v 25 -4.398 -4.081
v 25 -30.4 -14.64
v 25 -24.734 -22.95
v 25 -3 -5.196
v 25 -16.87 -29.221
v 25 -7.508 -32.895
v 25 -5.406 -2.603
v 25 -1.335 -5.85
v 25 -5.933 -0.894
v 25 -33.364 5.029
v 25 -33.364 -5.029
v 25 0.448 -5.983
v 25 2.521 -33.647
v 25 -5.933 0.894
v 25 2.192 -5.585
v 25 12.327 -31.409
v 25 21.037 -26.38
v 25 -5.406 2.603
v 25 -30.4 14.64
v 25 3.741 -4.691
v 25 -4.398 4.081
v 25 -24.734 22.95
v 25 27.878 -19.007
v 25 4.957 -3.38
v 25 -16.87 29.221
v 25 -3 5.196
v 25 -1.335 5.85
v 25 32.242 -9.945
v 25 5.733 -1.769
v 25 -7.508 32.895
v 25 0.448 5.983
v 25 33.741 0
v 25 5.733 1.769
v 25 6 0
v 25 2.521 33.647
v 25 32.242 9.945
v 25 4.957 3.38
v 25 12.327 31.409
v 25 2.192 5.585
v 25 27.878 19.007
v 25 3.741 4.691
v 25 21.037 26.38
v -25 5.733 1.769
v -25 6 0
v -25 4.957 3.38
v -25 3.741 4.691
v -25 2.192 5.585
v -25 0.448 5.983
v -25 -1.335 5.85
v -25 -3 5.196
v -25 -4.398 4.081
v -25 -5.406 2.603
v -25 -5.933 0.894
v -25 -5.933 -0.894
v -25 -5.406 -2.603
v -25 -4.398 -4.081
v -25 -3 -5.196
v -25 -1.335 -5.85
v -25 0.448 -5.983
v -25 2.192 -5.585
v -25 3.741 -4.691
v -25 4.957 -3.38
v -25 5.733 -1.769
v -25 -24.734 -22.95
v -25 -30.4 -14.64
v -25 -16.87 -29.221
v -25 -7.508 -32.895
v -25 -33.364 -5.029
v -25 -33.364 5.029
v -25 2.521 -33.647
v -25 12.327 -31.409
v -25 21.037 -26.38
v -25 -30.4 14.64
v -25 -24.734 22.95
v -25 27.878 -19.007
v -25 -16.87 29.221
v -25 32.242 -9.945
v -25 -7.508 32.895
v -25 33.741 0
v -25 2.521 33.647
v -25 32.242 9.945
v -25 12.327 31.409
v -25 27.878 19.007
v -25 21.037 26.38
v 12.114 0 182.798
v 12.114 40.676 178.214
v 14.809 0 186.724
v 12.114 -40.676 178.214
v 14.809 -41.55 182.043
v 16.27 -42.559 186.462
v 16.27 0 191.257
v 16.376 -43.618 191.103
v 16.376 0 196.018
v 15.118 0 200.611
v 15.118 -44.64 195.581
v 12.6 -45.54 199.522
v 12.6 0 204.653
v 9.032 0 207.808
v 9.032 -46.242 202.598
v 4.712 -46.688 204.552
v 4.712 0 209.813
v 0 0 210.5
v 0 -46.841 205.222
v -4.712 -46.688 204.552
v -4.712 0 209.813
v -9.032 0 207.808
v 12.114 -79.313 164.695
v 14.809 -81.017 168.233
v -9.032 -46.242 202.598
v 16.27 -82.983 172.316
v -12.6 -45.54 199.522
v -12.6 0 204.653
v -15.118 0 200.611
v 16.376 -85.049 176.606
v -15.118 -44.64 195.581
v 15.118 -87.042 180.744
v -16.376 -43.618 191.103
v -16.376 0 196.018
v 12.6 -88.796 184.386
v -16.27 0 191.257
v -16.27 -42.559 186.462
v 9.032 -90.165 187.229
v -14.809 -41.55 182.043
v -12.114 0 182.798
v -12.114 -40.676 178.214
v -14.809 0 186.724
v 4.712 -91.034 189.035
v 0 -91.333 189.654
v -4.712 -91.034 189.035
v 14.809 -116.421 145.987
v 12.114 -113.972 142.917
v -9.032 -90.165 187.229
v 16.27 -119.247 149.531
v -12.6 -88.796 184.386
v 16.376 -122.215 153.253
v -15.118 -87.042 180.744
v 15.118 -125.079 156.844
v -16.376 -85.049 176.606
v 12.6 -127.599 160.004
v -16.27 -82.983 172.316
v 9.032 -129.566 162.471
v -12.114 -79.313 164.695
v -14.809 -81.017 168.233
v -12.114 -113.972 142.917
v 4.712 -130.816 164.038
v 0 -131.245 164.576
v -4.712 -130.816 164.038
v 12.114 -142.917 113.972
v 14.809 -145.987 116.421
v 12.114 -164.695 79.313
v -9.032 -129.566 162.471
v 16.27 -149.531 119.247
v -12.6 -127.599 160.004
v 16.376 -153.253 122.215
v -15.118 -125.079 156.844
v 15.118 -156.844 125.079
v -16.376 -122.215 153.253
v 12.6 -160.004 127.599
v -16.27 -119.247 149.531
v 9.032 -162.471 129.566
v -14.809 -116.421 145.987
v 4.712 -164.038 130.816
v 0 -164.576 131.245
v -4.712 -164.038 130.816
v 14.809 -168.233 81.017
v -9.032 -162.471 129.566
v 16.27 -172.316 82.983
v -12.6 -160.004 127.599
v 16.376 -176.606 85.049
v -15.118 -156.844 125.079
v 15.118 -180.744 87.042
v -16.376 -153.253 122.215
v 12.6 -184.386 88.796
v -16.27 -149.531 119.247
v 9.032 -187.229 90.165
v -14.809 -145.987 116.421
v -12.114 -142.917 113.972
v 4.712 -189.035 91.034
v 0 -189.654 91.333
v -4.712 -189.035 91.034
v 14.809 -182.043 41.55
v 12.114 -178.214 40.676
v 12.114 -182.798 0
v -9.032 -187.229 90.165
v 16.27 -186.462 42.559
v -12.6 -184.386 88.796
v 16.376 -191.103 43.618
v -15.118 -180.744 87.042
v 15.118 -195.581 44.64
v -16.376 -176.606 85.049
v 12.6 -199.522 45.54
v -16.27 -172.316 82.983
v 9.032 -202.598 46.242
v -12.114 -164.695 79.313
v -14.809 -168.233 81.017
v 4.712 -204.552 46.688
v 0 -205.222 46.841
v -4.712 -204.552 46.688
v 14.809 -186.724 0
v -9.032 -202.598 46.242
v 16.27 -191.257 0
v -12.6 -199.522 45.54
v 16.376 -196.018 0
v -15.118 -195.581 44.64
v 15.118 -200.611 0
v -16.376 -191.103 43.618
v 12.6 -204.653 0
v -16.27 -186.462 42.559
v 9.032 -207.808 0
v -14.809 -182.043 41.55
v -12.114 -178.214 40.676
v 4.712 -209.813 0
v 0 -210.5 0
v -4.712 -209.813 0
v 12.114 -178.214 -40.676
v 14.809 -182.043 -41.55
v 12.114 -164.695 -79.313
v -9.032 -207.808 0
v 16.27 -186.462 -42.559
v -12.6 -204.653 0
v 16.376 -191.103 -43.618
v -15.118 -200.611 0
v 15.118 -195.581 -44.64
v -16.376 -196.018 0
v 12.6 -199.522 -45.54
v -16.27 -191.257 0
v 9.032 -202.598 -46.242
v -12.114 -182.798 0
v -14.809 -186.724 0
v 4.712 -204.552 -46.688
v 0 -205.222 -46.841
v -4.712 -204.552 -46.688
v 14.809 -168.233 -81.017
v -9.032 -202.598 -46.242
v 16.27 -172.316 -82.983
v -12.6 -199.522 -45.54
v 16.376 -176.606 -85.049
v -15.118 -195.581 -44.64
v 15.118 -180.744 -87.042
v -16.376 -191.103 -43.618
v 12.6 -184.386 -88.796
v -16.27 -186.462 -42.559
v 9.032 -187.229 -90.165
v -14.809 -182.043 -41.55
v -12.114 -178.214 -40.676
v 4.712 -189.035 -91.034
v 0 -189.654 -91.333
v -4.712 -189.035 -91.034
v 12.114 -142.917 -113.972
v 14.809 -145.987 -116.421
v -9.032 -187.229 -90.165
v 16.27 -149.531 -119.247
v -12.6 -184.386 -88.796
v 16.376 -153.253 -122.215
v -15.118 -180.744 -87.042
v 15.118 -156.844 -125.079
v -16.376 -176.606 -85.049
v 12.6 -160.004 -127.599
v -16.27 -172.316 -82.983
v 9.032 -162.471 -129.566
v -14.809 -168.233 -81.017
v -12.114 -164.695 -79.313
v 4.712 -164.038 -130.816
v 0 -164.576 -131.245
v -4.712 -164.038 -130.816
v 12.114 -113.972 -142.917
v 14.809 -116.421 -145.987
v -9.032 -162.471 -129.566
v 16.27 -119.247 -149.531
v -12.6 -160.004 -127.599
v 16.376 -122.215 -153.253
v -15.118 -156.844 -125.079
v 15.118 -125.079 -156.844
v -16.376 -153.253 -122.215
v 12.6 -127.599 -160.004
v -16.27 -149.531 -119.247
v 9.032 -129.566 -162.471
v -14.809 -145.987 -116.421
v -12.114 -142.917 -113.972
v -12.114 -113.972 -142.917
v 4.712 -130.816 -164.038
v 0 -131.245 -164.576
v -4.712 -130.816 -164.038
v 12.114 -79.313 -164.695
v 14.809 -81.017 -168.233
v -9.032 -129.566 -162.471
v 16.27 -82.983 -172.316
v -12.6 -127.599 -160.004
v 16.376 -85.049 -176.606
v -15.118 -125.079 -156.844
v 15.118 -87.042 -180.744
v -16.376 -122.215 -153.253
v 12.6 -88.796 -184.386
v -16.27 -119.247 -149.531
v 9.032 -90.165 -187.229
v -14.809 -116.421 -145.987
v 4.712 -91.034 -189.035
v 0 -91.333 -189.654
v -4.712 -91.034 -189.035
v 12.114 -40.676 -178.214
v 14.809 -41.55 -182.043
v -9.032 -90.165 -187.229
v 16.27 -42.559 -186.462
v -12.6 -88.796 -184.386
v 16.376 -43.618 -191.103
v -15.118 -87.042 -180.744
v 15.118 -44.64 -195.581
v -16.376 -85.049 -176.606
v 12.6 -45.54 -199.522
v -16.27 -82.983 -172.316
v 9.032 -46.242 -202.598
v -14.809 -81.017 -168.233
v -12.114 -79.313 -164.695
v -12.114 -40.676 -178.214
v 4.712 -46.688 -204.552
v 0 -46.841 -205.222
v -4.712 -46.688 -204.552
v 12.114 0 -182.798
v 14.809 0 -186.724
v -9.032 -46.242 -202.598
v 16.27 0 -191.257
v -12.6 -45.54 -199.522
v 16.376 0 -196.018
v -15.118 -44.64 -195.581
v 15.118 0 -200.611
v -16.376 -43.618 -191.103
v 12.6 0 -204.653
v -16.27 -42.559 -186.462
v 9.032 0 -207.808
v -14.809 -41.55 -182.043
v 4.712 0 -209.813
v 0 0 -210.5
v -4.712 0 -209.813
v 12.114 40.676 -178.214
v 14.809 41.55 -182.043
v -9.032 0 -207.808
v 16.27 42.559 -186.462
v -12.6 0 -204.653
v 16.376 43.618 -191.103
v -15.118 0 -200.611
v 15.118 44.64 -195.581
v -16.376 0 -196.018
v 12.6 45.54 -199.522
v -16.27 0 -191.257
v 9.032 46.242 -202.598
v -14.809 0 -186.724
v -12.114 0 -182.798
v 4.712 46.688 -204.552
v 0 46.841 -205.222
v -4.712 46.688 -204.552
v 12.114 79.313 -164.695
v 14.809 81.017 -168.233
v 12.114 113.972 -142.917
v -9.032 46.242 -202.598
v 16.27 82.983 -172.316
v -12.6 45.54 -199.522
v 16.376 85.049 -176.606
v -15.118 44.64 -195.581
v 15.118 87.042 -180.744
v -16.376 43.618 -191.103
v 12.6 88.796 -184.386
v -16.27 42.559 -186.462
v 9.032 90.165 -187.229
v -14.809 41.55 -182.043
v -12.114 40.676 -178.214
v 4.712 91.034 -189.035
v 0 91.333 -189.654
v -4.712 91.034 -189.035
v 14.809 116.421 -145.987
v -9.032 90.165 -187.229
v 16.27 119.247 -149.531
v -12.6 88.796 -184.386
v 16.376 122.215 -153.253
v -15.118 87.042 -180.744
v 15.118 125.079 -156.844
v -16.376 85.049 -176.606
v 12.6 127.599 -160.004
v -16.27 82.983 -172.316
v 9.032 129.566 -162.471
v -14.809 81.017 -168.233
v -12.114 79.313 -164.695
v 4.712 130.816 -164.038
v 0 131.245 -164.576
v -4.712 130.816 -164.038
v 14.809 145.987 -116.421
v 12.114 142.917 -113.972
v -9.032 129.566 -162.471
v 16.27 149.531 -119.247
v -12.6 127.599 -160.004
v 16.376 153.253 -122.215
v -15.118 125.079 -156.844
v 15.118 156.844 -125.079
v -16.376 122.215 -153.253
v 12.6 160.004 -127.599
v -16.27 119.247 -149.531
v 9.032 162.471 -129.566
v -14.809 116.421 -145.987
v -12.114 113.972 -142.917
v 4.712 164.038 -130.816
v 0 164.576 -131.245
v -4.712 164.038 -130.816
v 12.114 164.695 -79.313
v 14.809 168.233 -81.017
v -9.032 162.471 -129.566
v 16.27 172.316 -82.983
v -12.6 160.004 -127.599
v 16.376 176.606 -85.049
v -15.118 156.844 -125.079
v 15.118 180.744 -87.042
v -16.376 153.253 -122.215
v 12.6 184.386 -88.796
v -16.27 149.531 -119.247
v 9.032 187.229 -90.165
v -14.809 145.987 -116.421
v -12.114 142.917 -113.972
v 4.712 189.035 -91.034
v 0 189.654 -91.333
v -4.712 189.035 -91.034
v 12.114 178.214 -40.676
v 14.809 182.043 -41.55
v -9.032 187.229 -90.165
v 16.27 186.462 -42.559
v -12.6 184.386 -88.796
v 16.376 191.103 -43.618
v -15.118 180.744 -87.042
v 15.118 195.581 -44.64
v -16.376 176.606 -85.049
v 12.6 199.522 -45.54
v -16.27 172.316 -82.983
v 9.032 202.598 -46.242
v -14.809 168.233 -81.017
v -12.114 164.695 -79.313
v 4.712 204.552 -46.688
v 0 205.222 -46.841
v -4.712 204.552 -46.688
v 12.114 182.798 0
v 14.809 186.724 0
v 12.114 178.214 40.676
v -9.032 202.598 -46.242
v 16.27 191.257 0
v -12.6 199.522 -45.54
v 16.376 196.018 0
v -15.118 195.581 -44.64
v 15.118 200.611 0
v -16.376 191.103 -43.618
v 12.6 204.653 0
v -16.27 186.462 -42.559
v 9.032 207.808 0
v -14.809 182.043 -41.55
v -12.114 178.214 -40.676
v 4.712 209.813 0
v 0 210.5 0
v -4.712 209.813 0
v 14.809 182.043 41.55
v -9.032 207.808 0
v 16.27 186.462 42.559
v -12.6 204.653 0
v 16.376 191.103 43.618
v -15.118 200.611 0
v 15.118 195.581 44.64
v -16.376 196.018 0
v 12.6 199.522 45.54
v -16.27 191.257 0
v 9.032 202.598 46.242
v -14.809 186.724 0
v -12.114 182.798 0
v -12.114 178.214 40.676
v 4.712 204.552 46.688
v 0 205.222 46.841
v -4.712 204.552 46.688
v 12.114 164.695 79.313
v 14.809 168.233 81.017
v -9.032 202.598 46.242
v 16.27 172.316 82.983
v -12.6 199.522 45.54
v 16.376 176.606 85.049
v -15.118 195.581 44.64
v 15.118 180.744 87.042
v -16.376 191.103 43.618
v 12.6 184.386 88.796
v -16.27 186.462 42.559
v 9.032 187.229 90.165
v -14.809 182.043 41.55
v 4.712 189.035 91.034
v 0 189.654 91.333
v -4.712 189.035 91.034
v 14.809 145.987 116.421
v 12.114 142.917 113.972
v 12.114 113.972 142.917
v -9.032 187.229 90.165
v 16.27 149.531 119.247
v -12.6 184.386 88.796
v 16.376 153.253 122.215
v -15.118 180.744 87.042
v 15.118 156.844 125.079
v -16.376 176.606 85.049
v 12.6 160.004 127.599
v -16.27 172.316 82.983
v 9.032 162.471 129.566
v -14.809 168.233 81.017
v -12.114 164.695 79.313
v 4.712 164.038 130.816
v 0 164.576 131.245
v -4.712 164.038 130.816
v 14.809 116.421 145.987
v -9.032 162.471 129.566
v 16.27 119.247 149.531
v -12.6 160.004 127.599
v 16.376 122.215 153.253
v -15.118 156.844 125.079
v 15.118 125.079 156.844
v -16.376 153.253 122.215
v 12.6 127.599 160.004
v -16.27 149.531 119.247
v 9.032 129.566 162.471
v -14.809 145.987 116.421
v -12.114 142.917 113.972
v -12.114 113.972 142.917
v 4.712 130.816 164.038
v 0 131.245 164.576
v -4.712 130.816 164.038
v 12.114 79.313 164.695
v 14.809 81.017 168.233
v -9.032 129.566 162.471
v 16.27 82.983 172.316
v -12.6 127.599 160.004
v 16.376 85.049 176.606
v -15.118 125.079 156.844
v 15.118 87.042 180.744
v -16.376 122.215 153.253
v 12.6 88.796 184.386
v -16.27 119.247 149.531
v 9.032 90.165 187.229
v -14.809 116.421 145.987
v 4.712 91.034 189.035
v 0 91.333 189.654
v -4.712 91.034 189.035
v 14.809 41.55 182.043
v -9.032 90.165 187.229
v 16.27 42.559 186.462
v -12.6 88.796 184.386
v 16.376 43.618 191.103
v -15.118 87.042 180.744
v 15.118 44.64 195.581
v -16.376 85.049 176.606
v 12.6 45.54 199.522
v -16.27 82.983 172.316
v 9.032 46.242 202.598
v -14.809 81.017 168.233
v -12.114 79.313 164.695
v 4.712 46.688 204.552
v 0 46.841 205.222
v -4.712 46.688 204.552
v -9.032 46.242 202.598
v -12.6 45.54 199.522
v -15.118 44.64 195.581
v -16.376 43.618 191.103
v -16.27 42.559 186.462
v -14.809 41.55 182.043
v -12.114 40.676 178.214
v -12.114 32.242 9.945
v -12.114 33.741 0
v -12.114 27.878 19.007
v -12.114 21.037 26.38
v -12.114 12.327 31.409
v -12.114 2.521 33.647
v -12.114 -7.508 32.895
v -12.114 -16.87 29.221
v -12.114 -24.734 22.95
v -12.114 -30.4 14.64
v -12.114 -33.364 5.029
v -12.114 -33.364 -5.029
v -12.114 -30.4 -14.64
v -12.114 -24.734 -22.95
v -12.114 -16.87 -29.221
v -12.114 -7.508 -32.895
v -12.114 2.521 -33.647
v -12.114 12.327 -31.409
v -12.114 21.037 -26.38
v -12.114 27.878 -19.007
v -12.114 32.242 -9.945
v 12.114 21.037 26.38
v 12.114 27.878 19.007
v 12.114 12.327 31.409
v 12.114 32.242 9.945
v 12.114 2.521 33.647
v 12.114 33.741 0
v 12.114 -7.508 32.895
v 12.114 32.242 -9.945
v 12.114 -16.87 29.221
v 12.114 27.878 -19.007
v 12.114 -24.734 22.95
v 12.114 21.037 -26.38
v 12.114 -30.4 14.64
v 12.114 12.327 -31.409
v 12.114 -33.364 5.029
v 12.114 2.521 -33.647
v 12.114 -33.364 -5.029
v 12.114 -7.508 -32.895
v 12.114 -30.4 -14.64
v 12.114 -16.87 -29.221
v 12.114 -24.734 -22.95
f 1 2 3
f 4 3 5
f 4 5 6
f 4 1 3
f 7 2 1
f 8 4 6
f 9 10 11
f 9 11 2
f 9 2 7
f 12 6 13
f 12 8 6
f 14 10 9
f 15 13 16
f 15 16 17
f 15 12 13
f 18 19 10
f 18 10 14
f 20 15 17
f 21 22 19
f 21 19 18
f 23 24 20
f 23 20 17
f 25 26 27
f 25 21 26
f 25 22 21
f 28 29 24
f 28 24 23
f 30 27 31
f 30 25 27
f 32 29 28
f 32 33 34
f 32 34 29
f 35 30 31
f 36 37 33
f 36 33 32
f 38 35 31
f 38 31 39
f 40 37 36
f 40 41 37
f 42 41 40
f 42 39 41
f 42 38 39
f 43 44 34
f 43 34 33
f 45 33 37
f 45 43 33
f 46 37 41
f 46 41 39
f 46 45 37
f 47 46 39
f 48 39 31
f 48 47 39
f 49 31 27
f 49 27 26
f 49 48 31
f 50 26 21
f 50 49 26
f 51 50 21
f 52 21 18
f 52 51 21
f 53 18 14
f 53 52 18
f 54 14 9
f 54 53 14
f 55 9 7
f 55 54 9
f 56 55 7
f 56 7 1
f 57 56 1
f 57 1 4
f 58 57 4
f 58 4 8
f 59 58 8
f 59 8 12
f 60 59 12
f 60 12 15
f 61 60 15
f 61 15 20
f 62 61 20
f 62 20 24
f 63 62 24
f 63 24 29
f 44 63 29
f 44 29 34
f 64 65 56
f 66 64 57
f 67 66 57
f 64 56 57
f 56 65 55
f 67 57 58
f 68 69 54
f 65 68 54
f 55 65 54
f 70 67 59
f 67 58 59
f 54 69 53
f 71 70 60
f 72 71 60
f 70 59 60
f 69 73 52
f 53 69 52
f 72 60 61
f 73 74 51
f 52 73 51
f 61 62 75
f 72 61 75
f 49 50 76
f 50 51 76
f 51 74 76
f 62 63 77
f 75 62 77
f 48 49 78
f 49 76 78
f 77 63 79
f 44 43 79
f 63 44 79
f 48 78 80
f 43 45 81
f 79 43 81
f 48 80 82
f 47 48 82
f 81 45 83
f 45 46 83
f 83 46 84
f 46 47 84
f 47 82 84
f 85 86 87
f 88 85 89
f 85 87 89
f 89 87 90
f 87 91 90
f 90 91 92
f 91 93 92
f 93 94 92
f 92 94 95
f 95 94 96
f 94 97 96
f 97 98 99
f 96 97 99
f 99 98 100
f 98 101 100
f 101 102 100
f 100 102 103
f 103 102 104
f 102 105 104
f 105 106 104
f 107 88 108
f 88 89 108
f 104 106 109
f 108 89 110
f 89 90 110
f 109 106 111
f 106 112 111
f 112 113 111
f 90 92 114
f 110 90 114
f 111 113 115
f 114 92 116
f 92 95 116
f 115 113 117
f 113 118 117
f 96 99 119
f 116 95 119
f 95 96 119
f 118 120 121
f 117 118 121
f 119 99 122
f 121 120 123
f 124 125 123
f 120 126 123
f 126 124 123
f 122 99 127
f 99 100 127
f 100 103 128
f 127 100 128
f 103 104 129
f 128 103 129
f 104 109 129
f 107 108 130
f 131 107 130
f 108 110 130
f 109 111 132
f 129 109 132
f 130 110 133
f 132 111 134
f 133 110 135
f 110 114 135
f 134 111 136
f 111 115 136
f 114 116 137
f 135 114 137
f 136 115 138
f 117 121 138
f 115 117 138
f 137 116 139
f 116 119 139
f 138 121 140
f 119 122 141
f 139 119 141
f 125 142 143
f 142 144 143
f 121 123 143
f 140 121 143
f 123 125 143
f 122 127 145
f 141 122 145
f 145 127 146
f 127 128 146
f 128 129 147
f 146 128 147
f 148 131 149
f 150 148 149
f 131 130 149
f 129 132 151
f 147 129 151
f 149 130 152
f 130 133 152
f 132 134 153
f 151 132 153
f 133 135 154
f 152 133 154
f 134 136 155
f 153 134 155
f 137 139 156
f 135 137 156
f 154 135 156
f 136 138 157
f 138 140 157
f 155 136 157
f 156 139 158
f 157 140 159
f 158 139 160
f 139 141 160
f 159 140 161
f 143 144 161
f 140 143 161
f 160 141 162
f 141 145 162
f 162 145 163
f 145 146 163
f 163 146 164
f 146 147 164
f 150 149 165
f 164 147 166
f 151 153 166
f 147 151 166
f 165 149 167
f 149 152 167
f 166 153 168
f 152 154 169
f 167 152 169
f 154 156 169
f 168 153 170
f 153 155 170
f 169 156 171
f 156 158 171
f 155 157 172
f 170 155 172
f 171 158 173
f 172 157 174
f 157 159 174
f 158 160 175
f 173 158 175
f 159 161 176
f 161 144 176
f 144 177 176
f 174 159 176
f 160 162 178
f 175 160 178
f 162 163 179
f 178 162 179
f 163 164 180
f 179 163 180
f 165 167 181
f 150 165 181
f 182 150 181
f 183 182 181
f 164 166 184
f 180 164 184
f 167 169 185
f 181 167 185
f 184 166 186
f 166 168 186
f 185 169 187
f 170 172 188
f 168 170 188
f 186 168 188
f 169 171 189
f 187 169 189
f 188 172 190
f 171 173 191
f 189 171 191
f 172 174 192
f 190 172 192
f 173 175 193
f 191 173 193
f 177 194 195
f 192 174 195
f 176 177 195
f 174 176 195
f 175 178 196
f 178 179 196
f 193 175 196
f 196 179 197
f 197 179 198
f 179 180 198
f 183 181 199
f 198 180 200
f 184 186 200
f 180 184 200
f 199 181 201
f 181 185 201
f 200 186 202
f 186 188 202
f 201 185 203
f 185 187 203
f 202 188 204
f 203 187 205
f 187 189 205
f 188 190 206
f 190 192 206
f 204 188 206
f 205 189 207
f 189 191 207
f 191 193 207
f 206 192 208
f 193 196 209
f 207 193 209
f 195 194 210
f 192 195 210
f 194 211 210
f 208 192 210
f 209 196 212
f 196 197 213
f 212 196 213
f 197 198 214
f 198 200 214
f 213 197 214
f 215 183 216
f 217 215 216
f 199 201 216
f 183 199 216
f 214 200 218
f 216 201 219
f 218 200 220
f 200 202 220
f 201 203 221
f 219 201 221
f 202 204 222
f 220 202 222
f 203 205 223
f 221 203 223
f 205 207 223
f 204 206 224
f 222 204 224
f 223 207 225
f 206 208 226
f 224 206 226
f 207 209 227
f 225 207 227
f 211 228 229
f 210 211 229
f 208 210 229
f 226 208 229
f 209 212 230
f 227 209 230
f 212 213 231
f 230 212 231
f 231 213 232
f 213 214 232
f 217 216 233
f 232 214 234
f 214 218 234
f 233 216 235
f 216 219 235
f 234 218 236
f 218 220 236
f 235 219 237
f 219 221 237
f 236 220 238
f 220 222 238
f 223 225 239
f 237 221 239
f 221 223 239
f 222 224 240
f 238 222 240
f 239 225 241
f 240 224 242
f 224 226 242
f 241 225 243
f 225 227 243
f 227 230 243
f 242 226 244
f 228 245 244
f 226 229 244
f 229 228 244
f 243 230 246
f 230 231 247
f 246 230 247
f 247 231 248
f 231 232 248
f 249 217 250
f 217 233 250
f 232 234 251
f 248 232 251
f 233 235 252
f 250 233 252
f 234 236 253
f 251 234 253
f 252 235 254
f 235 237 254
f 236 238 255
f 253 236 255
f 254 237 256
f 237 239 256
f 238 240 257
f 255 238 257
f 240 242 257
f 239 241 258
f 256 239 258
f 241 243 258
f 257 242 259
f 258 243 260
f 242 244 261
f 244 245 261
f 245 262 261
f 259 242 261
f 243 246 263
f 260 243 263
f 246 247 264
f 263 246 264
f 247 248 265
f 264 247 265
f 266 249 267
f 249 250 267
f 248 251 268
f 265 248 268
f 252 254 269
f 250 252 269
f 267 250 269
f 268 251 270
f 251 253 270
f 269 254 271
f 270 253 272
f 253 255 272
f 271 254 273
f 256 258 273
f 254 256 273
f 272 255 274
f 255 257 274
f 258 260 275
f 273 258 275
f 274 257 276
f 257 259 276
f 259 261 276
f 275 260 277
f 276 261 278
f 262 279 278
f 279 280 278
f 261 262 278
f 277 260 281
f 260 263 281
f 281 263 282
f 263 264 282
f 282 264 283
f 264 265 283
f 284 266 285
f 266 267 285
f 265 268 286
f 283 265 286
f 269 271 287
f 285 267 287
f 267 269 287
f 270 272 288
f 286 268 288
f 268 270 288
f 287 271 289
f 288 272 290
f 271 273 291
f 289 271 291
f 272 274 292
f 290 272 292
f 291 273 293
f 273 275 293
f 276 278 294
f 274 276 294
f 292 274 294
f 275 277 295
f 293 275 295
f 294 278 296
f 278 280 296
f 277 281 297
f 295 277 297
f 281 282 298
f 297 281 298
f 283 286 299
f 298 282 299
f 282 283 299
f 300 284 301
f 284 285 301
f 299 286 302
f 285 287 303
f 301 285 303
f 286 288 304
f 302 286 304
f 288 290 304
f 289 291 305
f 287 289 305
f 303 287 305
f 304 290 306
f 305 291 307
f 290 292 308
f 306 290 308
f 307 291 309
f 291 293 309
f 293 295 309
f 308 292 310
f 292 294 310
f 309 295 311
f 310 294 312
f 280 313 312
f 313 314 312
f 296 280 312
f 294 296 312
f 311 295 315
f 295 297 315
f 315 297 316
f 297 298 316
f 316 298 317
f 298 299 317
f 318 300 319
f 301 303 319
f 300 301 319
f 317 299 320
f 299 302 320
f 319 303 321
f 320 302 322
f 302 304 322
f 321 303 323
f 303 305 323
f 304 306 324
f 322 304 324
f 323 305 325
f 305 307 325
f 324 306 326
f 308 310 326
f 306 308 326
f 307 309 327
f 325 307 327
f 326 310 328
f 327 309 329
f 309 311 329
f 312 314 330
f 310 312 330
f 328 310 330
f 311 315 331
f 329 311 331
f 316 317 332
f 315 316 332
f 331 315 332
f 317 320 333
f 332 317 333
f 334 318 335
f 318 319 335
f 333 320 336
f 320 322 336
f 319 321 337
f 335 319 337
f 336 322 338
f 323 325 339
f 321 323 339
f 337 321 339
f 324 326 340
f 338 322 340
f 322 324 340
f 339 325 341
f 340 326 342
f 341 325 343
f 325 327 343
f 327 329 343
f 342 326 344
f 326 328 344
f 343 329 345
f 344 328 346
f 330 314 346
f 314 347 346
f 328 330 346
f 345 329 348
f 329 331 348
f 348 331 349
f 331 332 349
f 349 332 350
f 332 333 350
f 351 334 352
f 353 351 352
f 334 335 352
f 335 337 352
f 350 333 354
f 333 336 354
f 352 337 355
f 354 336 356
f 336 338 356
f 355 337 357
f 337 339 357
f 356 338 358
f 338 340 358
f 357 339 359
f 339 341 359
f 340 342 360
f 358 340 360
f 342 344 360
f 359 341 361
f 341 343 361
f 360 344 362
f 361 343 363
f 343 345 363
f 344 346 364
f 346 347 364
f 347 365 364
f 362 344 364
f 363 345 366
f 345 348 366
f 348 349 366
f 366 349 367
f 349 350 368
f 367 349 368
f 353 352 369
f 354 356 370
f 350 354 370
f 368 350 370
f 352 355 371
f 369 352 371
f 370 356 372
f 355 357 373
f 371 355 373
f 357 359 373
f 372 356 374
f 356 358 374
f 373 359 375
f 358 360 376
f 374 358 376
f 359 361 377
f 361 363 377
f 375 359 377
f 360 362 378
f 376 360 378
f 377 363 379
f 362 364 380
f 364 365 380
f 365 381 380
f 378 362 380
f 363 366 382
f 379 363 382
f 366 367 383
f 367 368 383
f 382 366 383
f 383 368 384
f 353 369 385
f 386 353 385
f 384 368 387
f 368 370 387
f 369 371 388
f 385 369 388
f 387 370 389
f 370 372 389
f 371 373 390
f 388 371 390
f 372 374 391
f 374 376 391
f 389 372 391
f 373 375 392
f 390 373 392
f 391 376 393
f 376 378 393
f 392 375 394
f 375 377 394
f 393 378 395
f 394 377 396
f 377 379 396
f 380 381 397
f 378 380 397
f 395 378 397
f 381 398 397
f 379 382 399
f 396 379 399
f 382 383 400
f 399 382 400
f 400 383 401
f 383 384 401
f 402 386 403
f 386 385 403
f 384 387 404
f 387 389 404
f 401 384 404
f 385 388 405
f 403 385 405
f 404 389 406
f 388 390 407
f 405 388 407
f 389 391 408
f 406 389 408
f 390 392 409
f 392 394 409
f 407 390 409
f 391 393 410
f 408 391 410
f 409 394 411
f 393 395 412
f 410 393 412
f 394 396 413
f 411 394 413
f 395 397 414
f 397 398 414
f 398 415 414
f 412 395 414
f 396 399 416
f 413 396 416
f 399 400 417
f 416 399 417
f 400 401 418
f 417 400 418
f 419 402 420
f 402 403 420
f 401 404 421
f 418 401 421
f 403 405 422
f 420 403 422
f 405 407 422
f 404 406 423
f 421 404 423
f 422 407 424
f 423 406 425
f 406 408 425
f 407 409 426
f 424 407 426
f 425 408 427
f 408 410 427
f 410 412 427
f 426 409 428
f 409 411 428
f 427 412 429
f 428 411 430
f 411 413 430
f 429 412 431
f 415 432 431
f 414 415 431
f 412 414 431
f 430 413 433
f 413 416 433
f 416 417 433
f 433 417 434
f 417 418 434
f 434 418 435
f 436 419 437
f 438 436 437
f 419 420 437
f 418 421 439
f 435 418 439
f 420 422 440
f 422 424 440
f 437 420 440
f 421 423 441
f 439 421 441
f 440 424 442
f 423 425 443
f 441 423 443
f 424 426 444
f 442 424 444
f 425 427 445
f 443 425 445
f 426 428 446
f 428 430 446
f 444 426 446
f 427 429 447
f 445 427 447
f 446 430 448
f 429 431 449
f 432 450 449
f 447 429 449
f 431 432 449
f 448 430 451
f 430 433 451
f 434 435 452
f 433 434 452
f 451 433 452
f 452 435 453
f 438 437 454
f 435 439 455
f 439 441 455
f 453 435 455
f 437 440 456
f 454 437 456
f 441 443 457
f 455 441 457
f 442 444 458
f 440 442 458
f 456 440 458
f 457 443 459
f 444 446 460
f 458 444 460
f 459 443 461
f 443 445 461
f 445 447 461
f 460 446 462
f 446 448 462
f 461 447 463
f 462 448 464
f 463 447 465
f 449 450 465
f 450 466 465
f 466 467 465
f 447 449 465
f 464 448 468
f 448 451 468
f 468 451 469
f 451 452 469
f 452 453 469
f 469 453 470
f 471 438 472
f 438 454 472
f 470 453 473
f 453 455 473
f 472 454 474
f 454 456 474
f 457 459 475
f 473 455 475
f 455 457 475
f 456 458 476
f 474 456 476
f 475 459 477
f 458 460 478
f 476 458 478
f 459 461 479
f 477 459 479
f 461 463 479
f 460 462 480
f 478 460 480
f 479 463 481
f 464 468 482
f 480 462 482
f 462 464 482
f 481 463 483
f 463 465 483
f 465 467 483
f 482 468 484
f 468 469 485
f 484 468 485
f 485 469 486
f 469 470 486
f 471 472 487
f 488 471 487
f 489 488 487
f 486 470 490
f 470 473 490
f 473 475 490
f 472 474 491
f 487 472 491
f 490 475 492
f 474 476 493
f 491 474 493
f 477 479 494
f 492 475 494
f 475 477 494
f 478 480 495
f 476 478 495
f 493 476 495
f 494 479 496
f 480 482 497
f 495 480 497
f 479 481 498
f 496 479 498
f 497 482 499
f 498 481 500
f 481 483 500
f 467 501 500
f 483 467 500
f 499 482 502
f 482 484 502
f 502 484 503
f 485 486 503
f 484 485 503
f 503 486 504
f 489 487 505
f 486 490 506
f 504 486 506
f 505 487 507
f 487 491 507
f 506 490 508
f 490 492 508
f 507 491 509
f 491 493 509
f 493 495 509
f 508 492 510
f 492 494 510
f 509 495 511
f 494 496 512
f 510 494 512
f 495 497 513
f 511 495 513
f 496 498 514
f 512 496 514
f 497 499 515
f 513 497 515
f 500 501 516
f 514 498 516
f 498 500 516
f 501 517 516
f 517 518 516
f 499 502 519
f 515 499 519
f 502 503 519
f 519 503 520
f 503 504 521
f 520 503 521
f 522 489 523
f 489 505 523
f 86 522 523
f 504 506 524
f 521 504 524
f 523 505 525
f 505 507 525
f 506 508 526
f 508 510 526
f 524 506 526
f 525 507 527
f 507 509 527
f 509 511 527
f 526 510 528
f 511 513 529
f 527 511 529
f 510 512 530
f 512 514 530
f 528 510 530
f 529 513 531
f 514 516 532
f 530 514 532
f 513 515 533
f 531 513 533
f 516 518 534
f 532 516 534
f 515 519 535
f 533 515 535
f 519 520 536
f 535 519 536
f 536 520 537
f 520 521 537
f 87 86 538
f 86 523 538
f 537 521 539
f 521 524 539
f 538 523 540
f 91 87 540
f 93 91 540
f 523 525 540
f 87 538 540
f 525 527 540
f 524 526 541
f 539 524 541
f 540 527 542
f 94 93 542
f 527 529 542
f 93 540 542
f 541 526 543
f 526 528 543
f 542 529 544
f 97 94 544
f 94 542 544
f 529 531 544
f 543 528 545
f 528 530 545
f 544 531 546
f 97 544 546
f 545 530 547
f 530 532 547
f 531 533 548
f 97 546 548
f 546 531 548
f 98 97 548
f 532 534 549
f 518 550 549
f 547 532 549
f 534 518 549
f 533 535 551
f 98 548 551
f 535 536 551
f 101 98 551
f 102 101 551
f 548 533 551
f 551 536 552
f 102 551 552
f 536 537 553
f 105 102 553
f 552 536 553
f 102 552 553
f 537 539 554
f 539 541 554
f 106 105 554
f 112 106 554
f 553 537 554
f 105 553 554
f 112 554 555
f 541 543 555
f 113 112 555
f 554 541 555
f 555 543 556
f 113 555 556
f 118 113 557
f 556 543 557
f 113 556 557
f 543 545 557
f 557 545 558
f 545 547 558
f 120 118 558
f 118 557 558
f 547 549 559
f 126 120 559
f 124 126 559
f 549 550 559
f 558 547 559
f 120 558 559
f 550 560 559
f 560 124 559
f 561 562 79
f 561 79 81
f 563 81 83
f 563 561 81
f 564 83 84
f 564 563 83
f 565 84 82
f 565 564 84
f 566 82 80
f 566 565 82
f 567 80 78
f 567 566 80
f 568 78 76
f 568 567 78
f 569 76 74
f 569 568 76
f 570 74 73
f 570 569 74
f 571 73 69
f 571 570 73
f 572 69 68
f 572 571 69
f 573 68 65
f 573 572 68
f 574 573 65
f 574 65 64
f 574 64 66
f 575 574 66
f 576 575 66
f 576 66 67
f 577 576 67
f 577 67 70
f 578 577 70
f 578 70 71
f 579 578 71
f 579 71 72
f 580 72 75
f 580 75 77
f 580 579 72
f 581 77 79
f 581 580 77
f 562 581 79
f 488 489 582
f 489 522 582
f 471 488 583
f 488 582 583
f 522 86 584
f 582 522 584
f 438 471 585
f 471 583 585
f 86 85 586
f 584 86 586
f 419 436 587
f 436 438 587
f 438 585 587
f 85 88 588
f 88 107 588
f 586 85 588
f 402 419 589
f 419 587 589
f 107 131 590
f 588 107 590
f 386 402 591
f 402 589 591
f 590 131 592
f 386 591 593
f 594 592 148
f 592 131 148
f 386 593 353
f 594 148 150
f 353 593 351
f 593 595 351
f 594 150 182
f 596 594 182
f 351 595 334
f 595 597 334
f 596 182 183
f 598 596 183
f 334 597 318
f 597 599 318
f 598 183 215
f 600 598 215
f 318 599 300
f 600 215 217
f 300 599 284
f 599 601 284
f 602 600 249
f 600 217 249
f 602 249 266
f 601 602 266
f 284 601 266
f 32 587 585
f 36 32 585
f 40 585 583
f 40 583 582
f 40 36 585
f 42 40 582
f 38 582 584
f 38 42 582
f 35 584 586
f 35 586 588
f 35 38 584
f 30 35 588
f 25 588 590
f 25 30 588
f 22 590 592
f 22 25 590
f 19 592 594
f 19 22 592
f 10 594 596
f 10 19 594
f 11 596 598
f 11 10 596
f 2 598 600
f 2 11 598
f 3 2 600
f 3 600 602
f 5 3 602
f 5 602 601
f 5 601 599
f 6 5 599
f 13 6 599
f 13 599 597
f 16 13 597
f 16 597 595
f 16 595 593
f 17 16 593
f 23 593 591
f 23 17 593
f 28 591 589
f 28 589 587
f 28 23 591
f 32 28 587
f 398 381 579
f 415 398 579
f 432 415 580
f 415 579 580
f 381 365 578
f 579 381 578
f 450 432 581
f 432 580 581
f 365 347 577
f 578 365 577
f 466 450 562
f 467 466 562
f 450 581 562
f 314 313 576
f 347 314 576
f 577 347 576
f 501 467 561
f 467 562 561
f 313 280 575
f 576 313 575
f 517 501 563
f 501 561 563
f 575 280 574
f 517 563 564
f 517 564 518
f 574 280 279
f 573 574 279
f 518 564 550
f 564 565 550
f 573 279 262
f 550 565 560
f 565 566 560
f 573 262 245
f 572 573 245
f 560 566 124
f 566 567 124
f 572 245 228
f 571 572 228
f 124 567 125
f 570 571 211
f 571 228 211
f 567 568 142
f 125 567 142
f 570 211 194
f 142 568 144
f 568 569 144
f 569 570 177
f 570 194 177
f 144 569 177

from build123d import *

# Parameters (mm, degrees)
F2_R     = 6
F3_DEPTH = 25
F4_R     = 33.7409795254
F4_R_2   = 6
F5_DEPTH = 25


with BuildPart() as f1:
    # F0 (on Front) → F1 (revolve)
    with BuildSketch(Plane.XZ):
        with BuildLine():
            Line((12.1142669689, 0), (12.1142669689, 182.7975656304))
            ThreePointArc((12.1142669689, 182.7975656304), (0, 210.5), (-12.1142669689, 182.7975656304))
            Line((-12.1142669689, 182.7975656304), (-12.1142669689, 0))
            Line((-12.1142669689, 0), (12.1142669689, 0))
        make_face()
    revolve(axis=Axis((0, 0, 0), (1, 0, 0)))

    # F2 (on face) → F3 (cut)
    with BuildSketch(Plane.YZ.offset(12.1142669689)):
        Circle(F2_R)
    extrude(amount=-F3_DEPTH, mode=Mode.SUBTRACT)

    # F4 (on Right) → F5 (join, symmetric)
    with BuildSketch(Plane.YZ):
        Circle(F4_R)
        Circle(F4_R_2, mode=Mode.SUBTRACT)
    extrude(amount=F5_DEPTH, both=True)


solid = f1.part
